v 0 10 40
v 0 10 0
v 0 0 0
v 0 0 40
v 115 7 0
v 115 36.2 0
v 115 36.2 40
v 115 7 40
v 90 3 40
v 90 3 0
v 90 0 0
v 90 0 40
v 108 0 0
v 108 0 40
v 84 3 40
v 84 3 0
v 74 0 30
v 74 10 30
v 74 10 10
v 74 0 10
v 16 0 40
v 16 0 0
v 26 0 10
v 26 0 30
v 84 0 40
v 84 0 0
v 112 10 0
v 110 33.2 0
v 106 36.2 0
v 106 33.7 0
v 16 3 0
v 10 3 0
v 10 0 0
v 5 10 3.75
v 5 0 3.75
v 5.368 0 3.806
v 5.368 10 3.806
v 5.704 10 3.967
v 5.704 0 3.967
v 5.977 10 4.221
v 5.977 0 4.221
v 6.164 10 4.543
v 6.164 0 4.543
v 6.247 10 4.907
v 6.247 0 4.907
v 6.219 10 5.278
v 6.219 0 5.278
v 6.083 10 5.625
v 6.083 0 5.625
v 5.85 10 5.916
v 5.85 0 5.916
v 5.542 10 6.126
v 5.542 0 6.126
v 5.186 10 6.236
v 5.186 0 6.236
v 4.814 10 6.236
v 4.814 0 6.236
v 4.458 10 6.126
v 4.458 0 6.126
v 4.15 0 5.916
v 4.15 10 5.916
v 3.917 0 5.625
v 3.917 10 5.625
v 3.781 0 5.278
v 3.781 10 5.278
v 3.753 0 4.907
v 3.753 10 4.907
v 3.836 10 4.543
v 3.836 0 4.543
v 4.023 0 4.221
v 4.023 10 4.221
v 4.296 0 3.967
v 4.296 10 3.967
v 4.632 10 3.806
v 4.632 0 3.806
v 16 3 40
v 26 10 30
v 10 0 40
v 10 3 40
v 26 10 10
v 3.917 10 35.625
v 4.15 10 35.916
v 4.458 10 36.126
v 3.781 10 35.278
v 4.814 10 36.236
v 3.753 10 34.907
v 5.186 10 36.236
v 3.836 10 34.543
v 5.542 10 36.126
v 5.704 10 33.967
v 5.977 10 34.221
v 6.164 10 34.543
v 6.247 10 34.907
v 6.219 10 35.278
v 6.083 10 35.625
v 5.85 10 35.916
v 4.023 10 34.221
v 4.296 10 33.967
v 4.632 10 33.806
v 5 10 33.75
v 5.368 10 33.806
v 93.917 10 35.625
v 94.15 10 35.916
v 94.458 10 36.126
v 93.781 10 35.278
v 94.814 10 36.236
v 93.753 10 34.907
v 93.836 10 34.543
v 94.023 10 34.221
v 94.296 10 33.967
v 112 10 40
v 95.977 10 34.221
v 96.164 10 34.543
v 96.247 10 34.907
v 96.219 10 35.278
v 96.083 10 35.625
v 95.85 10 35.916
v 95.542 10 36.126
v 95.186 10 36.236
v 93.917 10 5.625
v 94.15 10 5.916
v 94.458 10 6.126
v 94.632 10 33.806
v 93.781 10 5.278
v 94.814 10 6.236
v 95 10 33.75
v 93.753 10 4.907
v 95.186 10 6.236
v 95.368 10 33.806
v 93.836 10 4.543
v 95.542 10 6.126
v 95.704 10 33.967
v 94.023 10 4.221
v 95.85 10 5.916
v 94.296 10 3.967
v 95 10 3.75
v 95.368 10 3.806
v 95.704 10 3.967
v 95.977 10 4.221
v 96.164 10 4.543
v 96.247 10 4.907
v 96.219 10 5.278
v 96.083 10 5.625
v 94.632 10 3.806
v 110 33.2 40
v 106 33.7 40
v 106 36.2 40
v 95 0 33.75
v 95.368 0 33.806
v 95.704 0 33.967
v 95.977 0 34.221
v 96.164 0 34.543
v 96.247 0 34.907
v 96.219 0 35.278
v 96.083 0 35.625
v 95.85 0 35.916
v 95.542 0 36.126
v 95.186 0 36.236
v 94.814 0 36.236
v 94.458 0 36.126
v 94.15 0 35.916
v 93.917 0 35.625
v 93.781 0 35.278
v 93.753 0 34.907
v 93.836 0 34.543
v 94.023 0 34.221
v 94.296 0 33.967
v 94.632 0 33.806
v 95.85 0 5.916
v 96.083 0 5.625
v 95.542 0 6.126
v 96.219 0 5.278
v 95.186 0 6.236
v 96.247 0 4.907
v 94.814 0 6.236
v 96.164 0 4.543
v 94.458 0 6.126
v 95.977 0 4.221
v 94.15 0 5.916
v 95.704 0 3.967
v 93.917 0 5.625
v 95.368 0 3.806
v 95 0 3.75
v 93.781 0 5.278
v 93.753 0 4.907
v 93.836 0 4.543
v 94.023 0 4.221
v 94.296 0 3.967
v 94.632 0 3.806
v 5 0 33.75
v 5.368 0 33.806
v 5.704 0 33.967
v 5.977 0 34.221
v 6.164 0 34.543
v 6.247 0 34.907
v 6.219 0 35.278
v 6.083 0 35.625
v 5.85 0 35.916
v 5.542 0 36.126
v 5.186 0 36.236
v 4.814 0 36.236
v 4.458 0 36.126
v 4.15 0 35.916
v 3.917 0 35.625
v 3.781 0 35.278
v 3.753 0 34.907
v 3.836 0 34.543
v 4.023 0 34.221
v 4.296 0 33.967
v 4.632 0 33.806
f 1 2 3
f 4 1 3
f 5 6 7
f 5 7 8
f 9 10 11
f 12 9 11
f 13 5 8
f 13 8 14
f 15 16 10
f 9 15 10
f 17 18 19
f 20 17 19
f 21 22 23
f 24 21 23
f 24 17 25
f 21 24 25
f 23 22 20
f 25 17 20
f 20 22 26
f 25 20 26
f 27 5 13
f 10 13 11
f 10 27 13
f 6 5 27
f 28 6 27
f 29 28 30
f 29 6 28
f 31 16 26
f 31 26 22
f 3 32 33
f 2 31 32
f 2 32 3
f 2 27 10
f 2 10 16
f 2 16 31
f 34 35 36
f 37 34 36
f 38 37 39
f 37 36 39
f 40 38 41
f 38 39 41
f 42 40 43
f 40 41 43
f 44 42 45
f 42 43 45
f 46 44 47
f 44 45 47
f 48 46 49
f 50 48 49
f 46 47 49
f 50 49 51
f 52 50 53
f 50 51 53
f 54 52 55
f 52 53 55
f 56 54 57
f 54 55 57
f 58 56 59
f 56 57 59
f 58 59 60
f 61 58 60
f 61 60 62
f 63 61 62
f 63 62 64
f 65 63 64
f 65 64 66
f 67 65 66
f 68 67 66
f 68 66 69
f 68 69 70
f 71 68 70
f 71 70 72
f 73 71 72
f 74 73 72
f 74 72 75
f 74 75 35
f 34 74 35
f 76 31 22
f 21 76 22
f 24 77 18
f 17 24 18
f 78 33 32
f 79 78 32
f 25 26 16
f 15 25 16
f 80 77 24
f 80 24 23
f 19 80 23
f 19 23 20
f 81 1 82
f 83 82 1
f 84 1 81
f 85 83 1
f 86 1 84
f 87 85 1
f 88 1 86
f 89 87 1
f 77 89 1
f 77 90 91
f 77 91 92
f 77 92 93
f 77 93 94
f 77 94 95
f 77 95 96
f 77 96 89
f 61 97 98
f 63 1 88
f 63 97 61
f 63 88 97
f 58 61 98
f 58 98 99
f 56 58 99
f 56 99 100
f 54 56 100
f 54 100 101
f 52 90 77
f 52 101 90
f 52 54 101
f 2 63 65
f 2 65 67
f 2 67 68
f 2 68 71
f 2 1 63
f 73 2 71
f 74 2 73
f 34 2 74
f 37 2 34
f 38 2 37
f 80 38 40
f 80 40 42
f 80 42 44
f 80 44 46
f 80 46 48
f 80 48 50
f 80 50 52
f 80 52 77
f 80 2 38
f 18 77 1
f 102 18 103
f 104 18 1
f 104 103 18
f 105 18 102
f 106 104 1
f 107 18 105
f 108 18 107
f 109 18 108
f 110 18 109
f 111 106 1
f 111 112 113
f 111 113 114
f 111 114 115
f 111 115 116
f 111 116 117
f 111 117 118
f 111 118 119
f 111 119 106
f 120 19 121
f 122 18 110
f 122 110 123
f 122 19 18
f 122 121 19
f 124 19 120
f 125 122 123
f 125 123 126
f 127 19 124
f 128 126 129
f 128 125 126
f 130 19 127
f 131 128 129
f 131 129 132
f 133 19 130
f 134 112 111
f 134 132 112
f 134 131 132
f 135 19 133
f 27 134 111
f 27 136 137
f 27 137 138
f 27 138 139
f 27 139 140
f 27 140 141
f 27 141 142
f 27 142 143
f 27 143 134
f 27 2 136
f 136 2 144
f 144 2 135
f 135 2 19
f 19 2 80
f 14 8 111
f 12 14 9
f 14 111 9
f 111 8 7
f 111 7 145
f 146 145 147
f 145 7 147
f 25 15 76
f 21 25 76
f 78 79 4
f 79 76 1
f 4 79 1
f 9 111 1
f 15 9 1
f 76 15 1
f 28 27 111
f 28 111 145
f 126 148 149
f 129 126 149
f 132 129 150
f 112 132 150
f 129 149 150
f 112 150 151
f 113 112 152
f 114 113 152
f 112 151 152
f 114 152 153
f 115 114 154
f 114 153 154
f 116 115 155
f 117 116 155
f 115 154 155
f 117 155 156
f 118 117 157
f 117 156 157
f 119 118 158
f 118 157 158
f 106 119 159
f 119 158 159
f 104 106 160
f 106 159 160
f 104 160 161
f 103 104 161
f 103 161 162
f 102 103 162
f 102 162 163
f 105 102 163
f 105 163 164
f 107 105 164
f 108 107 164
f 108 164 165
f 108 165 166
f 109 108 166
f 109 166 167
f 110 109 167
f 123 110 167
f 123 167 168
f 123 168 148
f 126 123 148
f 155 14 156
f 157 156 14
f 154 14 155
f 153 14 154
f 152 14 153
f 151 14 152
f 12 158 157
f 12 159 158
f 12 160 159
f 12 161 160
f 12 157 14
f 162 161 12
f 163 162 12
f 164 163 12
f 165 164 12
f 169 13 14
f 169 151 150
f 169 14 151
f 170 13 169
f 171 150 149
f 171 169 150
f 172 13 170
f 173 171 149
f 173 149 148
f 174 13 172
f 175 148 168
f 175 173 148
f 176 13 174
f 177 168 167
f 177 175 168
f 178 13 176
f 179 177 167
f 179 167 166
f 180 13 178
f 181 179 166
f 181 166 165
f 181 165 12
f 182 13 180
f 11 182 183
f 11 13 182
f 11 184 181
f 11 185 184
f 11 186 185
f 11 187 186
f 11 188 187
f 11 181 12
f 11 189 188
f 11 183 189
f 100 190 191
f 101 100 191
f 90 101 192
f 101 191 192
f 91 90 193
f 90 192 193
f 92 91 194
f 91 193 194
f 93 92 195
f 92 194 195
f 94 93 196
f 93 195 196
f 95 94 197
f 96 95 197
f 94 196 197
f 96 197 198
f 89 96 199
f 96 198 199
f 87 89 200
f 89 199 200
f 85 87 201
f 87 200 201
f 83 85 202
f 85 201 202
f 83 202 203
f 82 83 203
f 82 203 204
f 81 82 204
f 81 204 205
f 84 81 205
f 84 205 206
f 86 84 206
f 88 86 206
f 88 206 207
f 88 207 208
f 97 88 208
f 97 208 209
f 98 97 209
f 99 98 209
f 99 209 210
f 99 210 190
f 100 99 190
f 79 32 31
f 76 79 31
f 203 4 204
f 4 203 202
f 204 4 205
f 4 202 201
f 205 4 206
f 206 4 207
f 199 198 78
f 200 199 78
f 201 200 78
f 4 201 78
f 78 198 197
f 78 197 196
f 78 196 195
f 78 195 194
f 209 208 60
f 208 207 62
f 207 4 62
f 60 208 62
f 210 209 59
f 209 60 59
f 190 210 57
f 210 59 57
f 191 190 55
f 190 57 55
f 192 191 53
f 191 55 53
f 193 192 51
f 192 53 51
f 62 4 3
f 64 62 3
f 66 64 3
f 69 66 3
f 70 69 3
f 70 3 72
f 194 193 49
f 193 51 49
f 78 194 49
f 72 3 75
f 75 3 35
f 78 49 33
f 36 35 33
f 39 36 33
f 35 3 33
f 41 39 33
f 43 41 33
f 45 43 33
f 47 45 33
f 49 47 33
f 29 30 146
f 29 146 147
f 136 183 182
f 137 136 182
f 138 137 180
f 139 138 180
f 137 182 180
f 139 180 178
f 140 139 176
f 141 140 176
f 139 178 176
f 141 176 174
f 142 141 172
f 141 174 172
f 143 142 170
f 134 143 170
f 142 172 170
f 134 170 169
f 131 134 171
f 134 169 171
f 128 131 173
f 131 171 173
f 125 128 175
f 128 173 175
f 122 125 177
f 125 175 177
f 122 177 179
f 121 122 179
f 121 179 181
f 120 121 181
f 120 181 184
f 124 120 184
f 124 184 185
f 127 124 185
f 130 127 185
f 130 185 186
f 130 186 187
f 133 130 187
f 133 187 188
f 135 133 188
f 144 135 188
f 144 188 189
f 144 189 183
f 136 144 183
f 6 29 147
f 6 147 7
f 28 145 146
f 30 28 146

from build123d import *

# Parameters (mm, degrees)
BOSS_EXTRU_1_DEPTH      = 40
ENL_V_MAT_EXTRU_1_REACH = 110.167
ESQUISSE2_W             = 48
ESQUISSE2_H             = 20
ENL_V_MAT_EXTRU_2_REACH = 110.167
ESQUISSE3_R             = 1.25
BOSS_EXTRU_3_DEPTH      = 40


with BuildPart() as part:
    # Esquisse1 → Boss.-Extru.1 (new body)
    with BuildSketch(Plane.XY):
        Polygon((0, 0), (10, 0), (10, 3), (16, 3), (16, 0), (84, 0), (84, 3), (90, 3), (90, 0), (100, 0), (100, 10), (0, 10), align=None)
    extrude(amount=BOSS_EXTRU_1_DEPTH)

    # Esquisse2 → Enlèv. mat.-Extru.1 (cut, up to next)
    with BuildSketch(Plane(origin=(0, 10, 0), x_dir=(1, 0, 0), z_dir=(0, 1, 0)), mode=Mode.PRIVATE) as enl_v_mat_extru_1_sk1:
        with Locations((50, -20)):
            Rectangle(ESQUISSE2_W, ESQUISSE2_H)
    enl_v_mat_extru_1_tool1 = extrude(enl_v_mat_extru_1_sk1.sketch, amount=-ENL_V_MAT_EXTRU_1_REACH, mode=Mode.PRIVATE) & part.part
    add(enl_v_mat_extru_1_tool1.solids().sort_by_distance((50, 10, 20))[0], mode=Mode.SUBTRACT)

    # Esquisse3 → Enlèv. mat.-Extru.2 (cut, up to next)
    with BuildSketch(Plane.XZ, mode=Mode.PRIVATE) as enl_v_mat_extru_2_sk1:
        with Locations(Location((5, 35, 0), (0, 0, 270))):
            Circle(ESQUISSE3_R)
    enl_v_mat_extru_2_tool1 = extrude(enl_v_mat_extru_2_sk1.sketch, amount=-ENL_V_MAT_EXTRU_2_REACH, mode=Mode.PRIVATE) & part.part
    # Esquisse3 → Enlèv. mat.-Extru.2 (cut, up to next)
    with BuildSketch(Plane.XZ, mode=Mode.PRIVATE) as enl_v_mat_extru_2_sk2:
        with Locations(Location((5, 5, 0), (0, 0, 270))):
            Circle(ESQUISSE3_R)
    enl_v_mat_extru_2_tool2 = extrude(enl_v_mat_extru_2_sk2.sketch, amount=-ENL_V_MAT_EXTRU_2_REACH, mode=Mode.PRIVATE) & part.part
    # Esquisse3 → Enlèv. mat.-Extru.2 (cut, up to next)
    with BuildSketch(Plane.XZ, mode=Mode.PRIVATE) as enl_v_mat_extru_2_sk3:
        with Locations(Location((95, 35, 0), (0, 0, 270))):
            Circle(ESQUISSE3_R)
    enl_v_mat_extru_2_tool3 = extrude(enl_v_mat_extru_2_sk3.sketch, amount=-ENL_V_MAT_EXTRU_2_REACH, mode=Mode.PRIVATE) & part.part
    # Esquisse3 → Enlèv. mat.-Extru.2 (cut, up to next)
    with BuildSketch(Plane.XZ, mode=Mode.PRIVATE) as enl_v_mat_extru_2_sk4:
        with Locations(Location((95, 5, 0), (0, 0, 270))):
            Circle(ESQUISSE3_R)
    enl_v_mat_extru_2_tool4 = extrude(enl_v_mat_extru_2_sk4.sketch, amount=-ENL_V_MAT_EXTRU_2_REACH, mode=Mode.PRIVATE) & part.part
    add(enl_v_mat_extru_2_tool1.solids().sort_by_distance((5, 0, 35))[0], mode=Mode.SUBTRACT)
    add(enl_v_mat_extru_2_tool2.solids().sort_by_distance((5, 0, 5))[0], mode=Mode.SUBTRACT)
    add(enl_v_mat_extru_2_tool3.solids().sort_by_distance((95, 0, 35))[0], mode=Mode.SUBTRACT)
    add(enl_v_mat_extru_2_tool4.solids().sort_by_distance((95, 0, 5))[0], mode=Mode.SUBTRACT)

    # Esquisse4 → Boss.-Extru.3 (add)
    with BuildSketch(Plane(origin=(0, 0, 0), x_dir=(-1, 0, 0), z_dir=(0, 0, -1))):
        Polygon((-100, 10), (-112, 10), (-110, 33.2), (-106, 33.7), (-106, 36.2), (-115, 36.2), (-115, 7), (-108, 0), (-100, 0), align=None)
    extrude(amount=-BOSS_EXTRU_3_DEPTH)


solid = part.part
